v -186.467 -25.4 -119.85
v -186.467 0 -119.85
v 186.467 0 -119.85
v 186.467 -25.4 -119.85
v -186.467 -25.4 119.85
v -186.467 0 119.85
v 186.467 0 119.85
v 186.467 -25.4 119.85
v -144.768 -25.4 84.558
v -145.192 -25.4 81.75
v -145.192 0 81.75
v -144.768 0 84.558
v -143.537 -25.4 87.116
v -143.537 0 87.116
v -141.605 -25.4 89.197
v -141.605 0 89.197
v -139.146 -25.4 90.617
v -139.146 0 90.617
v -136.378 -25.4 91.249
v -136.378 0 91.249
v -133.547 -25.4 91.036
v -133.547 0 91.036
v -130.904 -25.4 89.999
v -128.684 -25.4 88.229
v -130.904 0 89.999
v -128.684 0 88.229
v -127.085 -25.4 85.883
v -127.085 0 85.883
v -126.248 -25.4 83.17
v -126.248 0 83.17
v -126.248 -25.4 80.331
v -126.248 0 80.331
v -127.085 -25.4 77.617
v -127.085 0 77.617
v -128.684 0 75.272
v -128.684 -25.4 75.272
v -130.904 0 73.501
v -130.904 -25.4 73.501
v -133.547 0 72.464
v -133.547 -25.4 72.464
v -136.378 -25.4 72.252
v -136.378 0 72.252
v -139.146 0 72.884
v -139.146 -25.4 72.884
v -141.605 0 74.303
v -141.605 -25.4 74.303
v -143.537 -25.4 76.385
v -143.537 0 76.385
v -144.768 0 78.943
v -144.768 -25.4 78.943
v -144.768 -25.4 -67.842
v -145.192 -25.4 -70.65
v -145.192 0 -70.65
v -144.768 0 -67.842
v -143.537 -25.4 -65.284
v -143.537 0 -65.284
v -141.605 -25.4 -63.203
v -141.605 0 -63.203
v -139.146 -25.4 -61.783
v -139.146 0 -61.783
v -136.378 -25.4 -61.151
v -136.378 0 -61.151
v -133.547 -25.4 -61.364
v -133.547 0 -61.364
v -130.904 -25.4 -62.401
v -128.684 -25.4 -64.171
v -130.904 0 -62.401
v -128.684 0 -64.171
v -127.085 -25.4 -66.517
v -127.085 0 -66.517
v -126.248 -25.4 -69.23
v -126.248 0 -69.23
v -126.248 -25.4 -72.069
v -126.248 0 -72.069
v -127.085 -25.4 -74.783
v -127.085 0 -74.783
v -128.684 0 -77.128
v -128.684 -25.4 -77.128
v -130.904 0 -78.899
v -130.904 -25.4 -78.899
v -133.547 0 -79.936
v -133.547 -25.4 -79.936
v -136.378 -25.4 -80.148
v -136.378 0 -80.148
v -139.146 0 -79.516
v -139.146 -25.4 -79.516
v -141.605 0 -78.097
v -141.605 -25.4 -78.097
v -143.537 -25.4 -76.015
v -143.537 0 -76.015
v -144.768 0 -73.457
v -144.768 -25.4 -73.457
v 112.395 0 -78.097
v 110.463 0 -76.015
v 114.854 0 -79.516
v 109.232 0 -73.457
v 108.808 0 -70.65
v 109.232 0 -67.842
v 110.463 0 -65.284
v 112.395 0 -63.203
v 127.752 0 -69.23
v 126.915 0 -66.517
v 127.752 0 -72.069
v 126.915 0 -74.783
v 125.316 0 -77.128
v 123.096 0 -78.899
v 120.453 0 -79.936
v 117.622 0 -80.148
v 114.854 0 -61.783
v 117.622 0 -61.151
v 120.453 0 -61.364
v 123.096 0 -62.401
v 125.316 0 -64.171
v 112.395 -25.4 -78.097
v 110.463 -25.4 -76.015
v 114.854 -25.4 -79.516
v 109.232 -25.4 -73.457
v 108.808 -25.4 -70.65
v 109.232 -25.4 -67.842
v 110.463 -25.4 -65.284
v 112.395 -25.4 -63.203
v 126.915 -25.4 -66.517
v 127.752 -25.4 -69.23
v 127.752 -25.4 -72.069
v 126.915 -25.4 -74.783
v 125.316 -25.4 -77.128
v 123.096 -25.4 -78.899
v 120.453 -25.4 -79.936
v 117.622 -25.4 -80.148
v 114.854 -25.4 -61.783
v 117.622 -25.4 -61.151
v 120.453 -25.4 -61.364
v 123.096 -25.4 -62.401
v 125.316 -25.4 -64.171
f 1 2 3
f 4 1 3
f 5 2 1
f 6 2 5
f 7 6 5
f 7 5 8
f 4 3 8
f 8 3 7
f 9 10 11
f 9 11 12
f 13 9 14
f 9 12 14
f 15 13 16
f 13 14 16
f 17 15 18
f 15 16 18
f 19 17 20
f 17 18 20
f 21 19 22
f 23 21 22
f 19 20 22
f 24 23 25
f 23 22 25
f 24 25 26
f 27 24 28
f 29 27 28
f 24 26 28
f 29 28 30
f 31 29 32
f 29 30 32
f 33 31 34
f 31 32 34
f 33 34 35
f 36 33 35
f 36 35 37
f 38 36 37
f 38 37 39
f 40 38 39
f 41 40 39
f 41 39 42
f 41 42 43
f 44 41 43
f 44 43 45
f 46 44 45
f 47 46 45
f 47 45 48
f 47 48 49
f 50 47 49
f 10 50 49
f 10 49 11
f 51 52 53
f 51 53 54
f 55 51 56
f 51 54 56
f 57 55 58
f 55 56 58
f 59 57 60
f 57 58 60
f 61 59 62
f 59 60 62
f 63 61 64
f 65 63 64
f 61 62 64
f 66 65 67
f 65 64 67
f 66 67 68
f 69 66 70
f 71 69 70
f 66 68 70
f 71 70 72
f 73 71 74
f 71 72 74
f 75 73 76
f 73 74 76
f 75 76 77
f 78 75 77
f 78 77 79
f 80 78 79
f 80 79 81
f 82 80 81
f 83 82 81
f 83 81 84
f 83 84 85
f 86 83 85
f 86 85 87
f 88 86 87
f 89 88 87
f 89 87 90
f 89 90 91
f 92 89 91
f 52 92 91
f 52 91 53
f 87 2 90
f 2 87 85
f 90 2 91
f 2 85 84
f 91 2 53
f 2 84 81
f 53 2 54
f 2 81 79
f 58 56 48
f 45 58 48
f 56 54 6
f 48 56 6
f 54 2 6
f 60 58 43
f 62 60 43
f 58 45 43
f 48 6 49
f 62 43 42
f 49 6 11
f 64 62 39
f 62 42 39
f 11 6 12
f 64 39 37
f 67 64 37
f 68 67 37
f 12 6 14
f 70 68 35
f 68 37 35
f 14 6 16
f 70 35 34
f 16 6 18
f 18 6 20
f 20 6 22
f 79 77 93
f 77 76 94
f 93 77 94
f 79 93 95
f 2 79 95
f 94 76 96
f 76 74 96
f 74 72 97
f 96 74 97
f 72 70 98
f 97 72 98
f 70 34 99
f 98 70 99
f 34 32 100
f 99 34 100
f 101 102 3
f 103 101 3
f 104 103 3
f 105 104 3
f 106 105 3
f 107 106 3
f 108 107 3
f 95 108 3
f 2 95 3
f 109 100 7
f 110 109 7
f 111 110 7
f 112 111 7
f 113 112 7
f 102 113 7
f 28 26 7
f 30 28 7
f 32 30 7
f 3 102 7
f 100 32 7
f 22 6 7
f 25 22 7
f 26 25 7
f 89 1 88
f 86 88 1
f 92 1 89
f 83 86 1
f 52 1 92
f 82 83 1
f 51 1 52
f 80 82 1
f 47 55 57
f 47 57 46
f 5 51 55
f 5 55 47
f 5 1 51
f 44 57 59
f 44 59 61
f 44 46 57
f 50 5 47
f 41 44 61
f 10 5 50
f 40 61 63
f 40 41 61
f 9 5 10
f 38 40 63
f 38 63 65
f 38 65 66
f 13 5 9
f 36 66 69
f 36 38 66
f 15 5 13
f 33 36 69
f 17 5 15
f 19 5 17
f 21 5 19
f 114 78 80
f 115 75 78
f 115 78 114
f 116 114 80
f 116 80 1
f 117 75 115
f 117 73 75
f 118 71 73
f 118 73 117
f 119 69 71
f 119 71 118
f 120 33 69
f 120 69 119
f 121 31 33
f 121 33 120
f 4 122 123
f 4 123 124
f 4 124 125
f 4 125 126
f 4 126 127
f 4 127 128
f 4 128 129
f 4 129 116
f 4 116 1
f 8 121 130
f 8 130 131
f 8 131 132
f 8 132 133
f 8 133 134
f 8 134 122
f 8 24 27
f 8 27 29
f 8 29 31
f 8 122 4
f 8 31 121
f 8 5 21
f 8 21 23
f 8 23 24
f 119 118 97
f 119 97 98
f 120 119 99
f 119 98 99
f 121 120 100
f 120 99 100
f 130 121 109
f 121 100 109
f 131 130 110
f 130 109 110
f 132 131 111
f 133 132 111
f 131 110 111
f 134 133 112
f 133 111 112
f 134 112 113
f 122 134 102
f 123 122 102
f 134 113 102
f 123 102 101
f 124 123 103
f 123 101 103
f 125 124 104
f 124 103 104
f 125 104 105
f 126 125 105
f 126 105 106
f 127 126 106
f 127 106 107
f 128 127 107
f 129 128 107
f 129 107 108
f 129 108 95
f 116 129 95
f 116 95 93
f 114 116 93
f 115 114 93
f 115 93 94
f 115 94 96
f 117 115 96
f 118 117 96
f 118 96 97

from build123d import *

# Parameters (mm, degrees)
F0_W     = 372.93318
F0_H     = 239.700406
F1_DEPTH = 25.4
F3_D     = 19.05


with BuildPart() as f1:
    # F0 (on Front) → F1 (new body)
    with BuildSketch(Plane.XZ):
        Rectangle(F0_W, F0_H)
    extrude(amount=F1_DEPTH)

    # F3 (through all)
    with Locations(Plane.XZ.offset(25.4)):
        with Locations((-135.66659, 81.750203), (-135.66659, -70.649797), (118.33341, -70.649797)):
            Hole(F3_D / 2)


solid = f1.part
